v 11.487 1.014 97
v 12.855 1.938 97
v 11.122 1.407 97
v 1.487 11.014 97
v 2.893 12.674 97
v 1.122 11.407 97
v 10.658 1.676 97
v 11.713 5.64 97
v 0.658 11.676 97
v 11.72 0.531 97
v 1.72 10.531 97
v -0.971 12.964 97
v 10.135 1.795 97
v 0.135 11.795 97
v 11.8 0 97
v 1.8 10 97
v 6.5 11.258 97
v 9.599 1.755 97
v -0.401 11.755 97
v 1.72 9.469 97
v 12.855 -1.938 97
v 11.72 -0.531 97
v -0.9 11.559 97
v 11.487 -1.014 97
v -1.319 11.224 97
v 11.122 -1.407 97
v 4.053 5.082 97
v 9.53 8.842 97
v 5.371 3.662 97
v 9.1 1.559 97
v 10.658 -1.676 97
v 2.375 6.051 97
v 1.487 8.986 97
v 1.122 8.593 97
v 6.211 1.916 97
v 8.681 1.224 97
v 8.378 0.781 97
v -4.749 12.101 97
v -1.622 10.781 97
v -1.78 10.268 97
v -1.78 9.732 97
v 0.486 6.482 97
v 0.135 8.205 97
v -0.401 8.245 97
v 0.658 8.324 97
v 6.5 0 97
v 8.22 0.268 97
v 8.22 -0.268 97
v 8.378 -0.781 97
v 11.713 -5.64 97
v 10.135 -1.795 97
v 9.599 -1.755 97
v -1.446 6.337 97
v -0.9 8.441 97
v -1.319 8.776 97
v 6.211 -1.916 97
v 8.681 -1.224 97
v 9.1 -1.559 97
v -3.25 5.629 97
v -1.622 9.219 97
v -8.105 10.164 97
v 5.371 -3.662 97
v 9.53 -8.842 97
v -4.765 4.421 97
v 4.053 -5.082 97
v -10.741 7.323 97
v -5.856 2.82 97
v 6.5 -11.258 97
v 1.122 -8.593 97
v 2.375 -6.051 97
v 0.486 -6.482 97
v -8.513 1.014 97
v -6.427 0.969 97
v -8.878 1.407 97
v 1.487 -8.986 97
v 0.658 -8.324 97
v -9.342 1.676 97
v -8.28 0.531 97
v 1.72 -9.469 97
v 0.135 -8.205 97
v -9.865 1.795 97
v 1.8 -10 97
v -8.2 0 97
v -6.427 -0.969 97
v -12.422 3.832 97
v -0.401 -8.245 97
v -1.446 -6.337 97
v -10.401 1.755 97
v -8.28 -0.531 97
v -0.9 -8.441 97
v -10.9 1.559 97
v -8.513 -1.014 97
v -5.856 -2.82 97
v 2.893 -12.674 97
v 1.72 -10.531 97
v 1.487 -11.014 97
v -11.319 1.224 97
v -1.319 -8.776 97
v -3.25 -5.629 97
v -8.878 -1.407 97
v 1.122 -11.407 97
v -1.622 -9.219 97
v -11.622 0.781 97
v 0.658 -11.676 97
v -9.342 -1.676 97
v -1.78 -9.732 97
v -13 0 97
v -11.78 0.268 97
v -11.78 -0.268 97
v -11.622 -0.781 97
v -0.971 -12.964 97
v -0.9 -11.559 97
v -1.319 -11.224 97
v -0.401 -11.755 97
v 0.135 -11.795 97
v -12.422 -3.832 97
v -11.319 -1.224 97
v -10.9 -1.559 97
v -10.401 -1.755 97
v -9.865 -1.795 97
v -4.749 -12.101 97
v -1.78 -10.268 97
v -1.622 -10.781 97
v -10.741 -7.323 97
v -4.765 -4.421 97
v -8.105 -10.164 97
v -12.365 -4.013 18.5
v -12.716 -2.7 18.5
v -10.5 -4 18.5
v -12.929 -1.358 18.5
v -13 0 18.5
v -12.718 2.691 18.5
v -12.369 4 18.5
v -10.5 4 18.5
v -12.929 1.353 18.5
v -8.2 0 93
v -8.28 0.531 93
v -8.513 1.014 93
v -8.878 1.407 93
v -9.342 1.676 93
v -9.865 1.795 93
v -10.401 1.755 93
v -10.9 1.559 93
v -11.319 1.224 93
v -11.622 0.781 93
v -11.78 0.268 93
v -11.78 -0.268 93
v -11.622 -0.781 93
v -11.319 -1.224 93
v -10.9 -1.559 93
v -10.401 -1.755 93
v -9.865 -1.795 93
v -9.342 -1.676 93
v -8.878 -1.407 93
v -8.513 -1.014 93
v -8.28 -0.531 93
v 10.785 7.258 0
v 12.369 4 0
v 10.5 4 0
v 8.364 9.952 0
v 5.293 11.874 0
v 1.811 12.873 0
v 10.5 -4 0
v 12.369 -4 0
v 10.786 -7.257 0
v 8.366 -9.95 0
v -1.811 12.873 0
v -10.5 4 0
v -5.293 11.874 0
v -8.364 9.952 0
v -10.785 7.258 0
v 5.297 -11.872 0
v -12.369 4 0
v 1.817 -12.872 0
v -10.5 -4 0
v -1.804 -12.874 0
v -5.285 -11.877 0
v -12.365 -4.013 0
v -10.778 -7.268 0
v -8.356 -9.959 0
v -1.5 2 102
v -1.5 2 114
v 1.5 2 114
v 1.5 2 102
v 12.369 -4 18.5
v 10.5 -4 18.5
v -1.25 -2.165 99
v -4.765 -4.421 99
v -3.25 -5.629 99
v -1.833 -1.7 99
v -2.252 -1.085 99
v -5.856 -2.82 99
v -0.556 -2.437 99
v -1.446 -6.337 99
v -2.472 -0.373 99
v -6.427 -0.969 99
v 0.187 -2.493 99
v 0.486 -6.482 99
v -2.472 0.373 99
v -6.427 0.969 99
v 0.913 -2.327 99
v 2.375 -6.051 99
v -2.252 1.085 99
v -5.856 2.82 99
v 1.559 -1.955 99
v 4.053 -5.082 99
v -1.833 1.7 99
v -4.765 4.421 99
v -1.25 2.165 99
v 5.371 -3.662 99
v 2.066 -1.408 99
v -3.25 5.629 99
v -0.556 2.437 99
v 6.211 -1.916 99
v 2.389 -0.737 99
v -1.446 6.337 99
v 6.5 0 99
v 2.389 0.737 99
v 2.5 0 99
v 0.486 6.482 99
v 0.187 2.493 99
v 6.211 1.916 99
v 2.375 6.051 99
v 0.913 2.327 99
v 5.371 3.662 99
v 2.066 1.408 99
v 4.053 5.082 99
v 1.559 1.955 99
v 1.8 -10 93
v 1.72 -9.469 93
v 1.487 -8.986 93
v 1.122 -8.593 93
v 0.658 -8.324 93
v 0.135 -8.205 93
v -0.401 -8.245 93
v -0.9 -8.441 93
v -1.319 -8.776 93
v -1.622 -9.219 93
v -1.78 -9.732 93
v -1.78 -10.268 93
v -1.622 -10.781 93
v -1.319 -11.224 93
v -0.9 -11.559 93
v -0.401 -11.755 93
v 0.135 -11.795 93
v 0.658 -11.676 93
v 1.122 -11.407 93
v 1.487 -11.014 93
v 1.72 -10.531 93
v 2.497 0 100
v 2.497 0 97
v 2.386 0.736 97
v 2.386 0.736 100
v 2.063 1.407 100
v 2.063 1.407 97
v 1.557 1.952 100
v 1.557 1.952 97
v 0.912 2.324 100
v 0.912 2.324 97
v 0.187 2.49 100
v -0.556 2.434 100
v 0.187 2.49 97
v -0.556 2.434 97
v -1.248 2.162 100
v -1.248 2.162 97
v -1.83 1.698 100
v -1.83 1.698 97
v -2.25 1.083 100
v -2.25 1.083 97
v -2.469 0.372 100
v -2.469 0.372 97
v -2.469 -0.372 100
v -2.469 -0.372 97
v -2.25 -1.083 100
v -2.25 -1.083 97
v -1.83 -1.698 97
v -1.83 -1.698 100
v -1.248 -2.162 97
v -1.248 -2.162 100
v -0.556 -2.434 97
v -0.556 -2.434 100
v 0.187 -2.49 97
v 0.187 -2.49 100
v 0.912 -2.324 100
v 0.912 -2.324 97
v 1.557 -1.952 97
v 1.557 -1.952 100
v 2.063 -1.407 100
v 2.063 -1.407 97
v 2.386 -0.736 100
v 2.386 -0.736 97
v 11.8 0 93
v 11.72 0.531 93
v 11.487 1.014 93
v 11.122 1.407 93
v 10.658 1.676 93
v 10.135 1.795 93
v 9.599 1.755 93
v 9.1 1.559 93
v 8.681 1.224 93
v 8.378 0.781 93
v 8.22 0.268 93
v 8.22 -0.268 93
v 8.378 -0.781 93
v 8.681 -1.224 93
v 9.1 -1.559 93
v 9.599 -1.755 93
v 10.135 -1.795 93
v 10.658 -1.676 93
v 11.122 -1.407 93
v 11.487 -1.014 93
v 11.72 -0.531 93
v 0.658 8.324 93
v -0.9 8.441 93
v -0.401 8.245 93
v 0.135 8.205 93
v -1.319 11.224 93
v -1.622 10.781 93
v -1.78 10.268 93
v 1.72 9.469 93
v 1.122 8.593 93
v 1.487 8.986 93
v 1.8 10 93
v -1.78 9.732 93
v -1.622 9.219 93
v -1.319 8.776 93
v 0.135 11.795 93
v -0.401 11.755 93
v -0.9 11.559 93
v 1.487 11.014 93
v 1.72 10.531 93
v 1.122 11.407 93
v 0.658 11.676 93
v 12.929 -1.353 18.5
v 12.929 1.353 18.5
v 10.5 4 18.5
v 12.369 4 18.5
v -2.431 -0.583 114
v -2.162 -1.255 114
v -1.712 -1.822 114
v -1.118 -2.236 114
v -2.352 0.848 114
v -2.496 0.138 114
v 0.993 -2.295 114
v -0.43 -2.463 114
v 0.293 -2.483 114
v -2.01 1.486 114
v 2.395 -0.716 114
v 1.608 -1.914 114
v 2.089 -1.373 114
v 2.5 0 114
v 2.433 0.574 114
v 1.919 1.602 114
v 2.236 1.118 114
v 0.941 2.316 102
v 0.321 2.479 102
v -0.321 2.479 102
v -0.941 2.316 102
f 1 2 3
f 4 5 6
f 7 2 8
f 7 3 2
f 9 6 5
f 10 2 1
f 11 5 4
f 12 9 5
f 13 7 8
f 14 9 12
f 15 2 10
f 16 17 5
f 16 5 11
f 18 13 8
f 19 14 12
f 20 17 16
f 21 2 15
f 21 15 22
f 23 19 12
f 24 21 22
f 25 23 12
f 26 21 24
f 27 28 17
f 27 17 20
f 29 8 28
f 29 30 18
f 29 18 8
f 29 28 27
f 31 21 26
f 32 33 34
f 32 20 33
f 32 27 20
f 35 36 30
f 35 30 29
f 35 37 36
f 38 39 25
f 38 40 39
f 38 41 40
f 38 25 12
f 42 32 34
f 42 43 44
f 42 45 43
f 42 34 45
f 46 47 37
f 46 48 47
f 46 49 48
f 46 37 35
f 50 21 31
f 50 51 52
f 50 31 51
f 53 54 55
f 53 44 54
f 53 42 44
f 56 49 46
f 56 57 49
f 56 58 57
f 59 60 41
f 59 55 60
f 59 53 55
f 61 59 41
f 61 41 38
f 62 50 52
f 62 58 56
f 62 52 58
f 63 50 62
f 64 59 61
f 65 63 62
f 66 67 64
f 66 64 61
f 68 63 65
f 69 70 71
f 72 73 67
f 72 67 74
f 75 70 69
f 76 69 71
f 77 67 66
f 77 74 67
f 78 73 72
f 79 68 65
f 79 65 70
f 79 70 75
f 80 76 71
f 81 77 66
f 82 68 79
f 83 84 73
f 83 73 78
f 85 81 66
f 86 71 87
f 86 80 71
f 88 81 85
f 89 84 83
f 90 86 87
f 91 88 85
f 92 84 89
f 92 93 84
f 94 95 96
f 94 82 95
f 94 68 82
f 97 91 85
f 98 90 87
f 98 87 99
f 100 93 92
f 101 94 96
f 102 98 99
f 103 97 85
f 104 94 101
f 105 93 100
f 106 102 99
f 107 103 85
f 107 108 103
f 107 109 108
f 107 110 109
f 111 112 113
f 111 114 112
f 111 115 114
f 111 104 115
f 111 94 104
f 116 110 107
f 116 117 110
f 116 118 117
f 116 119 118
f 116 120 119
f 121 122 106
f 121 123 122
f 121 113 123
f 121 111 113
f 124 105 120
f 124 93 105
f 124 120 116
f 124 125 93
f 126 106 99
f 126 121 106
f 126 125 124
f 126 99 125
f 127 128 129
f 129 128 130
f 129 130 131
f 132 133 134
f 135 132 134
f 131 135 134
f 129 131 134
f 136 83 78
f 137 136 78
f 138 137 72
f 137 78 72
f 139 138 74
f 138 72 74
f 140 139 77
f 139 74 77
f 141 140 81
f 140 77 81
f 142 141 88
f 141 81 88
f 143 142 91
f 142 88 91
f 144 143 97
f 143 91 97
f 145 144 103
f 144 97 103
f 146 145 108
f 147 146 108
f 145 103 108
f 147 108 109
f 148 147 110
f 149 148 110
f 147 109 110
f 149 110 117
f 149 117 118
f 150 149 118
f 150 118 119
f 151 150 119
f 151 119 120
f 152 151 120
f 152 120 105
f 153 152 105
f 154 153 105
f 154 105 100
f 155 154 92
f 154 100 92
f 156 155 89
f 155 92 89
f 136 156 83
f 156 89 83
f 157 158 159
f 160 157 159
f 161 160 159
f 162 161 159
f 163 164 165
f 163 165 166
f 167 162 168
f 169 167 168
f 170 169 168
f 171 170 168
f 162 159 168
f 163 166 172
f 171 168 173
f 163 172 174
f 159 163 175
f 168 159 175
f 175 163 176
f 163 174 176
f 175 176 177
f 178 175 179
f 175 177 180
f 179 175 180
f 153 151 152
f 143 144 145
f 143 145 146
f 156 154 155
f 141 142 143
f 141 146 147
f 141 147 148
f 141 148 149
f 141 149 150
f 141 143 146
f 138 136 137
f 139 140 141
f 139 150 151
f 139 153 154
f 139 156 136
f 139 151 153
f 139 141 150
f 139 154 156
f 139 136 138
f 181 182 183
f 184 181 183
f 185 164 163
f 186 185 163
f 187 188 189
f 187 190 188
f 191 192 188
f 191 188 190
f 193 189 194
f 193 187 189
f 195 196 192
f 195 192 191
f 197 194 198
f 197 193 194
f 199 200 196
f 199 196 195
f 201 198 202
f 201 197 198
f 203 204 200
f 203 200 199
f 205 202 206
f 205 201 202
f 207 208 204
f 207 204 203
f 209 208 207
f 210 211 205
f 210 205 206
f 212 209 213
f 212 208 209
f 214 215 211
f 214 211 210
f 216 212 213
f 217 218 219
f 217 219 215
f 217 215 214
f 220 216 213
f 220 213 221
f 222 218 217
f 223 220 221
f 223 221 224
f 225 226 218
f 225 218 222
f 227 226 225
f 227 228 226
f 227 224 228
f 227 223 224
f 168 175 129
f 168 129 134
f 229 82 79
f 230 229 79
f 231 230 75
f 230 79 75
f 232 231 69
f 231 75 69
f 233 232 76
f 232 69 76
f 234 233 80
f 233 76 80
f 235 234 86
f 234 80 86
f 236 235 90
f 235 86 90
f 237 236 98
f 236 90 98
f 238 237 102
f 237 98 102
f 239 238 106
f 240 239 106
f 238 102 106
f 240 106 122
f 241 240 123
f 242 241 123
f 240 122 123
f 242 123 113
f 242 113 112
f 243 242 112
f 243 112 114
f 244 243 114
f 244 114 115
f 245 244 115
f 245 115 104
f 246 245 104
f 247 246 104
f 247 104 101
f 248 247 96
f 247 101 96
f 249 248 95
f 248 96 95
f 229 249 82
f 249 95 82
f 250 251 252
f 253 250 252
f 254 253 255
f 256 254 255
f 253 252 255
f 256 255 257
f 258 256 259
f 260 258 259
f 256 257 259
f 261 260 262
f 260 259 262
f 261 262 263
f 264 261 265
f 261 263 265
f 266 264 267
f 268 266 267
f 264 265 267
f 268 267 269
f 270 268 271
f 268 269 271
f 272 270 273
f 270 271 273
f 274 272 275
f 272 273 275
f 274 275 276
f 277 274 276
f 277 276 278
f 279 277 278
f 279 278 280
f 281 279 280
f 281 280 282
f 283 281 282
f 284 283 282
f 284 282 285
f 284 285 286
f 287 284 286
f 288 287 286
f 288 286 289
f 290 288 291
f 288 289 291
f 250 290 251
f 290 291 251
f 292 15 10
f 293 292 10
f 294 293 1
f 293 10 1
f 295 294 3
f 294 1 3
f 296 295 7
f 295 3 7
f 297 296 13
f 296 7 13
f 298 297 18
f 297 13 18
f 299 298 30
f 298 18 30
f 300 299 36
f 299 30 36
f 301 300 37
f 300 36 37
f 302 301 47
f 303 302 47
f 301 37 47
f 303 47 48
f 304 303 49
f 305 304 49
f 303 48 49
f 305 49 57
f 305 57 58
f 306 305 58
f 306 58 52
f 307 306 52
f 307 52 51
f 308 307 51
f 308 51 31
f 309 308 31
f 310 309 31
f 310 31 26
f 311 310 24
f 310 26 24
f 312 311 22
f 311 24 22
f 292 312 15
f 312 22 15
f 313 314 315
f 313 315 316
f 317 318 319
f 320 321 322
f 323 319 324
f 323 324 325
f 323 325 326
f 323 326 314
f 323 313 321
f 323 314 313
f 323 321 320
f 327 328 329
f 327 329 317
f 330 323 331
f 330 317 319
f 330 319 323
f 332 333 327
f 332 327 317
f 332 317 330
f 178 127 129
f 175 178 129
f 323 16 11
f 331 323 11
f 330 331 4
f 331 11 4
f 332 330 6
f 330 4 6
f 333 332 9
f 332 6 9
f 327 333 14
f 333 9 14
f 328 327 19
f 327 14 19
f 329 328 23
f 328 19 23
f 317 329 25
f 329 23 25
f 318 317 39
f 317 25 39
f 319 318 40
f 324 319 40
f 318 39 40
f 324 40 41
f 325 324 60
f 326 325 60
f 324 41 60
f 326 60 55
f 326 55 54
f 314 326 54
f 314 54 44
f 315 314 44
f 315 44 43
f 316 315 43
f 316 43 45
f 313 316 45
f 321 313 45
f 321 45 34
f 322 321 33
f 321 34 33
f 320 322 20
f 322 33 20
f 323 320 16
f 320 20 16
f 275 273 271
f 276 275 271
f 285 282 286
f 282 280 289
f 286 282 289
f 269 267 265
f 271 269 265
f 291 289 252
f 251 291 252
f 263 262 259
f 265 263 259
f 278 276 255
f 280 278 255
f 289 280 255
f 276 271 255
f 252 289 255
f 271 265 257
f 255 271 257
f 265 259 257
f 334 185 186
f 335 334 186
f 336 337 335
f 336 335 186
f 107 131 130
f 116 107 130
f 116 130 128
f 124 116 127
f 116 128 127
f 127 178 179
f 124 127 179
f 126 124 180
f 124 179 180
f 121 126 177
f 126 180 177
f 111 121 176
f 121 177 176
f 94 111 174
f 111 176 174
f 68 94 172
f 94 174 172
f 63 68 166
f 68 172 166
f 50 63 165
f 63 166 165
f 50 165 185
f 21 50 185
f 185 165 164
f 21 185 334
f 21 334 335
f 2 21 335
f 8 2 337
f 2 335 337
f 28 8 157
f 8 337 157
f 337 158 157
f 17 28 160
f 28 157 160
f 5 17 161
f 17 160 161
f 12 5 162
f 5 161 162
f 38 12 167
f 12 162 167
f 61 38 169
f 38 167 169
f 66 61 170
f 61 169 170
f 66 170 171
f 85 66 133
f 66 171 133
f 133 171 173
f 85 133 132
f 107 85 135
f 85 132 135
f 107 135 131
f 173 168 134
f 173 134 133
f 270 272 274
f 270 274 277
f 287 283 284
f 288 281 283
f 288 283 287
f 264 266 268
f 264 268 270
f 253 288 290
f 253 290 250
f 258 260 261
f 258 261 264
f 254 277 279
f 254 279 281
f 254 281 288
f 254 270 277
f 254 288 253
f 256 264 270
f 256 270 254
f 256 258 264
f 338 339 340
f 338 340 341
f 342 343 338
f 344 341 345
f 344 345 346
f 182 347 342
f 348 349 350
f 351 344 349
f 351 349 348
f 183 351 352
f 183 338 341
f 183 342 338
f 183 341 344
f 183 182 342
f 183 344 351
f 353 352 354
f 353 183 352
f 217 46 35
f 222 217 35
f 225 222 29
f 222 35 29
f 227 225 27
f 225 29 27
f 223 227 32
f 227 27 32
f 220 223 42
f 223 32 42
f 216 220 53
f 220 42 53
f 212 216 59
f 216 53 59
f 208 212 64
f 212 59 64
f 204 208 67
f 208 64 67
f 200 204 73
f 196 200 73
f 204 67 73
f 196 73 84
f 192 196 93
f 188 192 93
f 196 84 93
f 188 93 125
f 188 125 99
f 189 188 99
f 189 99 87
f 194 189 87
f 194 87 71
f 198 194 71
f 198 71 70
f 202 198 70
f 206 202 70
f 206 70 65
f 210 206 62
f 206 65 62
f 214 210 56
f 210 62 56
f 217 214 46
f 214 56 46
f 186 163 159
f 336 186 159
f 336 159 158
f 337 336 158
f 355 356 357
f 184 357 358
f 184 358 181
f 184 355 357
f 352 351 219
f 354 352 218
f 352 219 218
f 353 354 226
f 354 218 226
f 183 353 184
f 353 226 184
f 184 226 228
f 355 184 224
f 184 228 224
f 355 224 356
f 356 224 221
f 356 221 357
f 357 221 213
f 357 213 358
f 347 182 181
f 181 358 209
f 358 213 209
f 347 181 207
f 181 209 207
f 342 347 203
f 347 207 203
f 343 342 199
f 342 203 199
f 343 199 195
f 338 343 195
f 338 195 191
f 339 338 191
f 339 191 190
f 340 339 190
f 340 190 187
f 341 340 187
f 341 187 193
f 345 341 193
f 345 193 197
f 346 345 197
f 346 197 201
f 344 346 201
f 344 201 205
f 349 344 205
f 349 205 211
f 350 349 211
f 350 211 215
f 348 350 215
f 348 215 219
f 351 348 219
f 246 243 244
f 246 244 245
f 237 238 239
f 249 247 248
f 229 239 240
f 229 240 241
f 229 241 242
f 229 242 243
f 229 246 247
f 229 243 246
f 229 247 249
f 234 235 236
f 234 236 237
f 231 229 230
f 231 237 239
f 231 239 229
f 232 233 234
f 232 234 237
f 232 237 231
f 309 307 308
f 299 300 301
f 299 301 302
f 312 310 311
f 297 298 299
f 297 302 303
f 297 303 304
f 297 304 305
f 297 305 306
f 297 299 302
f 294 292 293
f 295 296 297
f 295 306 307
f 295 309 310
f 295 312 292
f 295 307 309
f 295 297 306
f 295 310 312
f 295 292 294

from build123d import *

# Parameters (mm, degrees)
ESQUISSE1_R             = 13
BOSS_EXTRU_1_DEPTH      = 97
ESQUISSE2_R             = 2.5
BOSS_EXTRU_2_DEPTH      = 17
ENL_V_MAT_EXTRU_1_DEPTH = 18.5
ESQUISSE4_R             = 6.5
ESQUISSE4_R_2           = 2.5
BOSS_EXTRU_3_DEPTH      = 2
ESQUISSE5_R             = 1.8
ENL_V_MAT_EXTRU_2_DEPTH = 4
ENL_V_START             = -12
ENL_V_MAT_EXTRU_3_DEPTH = 12
ESQUISSE7_R             = 2.496805343
BOSS_EXTRU_4_DEPTH      = 3


with BuildPart() as part:
    # Esquisse1 → Boss.-Extru.1 (new body)
    with BuildSketch(Plane.XY):
        with Locations(Location((0, 0, 0), (0, 0, 180))):
            Circle(ESQUISSE1_R)
    extrude(amount=BOSS_EXTRU_1_DEPTH)

    # Esquisse2 → Boss.-Extru.2 (add)
    with BuildSketch(Plane.XY.offset(97)):
        Circle(ESQUISSE2_R)
    extrude(amount=BOSS_EXTRU_2_DEPTH)

    # Esquisse3 → Enlèv. mat.-Extru.1 (cut)
    with BuildSketch(Plane(origin=(0, 0, 0), x_dir=(-1, 0, 0), z_dir=(0, 0, -1))):
        with BuildLine():
            Line((-10.5, 0), (-10.5, 4))
            Line((-10.5, 4), (-12.369316877, 4))
            ThreePointArc((-12.369316877, 4), (-13, 0), (-12.369316877, -4))
            Line((-12.369316877, -4), (-10.5, -4))
            Line((-10.5, -4), (-10.5, 0))
        make_face()
        with BuildLine():
            Line((10.5, 0), (10.5, 4))
            Line((10.5, 4), (12.369316877, 4))
            ThreePointArc((12.369316877, 4), (12.99999812, -0.006990598), (12.365007817, -4.013300596))
            Line((12.365007817, -4.013300596), (10.5, -4))
            Line((10.5, -4), (10.5, 0))
        make_face()
    extrude(amount=-ENL_V_MAT_EXTRU_1_DEPTH, mode=Mode.SUBTRACT)

    # Esquisse4 → Boss.-Extru.3 (add)
    with BuildSketch(Plane.XY.offset(97)):
        Circle(ESQUISSE4_R)
        Circle(ESQUISSE4_R_2, mode=Mode.SUBTRACT)
    extrude(amount=BOSS_EXTRU_3_DEPTH)

    # Esquisse5 → Enlèv. mat.-Extru.2 (cut)
    with BuildSketch(Plane.XY.offset(97)):
        with Locations((0, 10)):
            Circle(ESQUISSE5_R)
        with Locations((-10, 0)):
            Circle(ESQUISSE5_R)
        with Locations((0, -10)):
            Circle(ESQUISSE5_R)
        with Locations((10, 0)):
            Circle(ESQUISSE5_R)
    extrude(amount=-ENL_V_MAT_EXTRU_2_DEPTH, mode=Mode.SUBTRACT)

    # Esquisse6 → Enlèv. mat.-Extru.3 (cut)
    with BuildSketch(Plane.XY.offset(114).offset(ENL_V_START)):
        with BuildLine():
            Line((0, 2), (1.5, 2))
            ThreePointArc((1.5, 2), (0, 2.5), (-1.5, 2))
            Line((-1.5, 2), (0, 2))
        make_face()
    extrude(amount=ENL_V_MAT_EXTRU_3_DEPTH, mode=Mode.SUBTRACT)


with BuildPart() as body_2:
    # Esquisse7 → Boss.-Extru.4 (new body)
    with BuildSketch(Plane.XY.offset(97)):
        Circle(ESQUISSE7_R)
    extrude(amount=BOSS_EXTRU_4_DEPTH)


solid = Compound([part.part, body_2.part])
